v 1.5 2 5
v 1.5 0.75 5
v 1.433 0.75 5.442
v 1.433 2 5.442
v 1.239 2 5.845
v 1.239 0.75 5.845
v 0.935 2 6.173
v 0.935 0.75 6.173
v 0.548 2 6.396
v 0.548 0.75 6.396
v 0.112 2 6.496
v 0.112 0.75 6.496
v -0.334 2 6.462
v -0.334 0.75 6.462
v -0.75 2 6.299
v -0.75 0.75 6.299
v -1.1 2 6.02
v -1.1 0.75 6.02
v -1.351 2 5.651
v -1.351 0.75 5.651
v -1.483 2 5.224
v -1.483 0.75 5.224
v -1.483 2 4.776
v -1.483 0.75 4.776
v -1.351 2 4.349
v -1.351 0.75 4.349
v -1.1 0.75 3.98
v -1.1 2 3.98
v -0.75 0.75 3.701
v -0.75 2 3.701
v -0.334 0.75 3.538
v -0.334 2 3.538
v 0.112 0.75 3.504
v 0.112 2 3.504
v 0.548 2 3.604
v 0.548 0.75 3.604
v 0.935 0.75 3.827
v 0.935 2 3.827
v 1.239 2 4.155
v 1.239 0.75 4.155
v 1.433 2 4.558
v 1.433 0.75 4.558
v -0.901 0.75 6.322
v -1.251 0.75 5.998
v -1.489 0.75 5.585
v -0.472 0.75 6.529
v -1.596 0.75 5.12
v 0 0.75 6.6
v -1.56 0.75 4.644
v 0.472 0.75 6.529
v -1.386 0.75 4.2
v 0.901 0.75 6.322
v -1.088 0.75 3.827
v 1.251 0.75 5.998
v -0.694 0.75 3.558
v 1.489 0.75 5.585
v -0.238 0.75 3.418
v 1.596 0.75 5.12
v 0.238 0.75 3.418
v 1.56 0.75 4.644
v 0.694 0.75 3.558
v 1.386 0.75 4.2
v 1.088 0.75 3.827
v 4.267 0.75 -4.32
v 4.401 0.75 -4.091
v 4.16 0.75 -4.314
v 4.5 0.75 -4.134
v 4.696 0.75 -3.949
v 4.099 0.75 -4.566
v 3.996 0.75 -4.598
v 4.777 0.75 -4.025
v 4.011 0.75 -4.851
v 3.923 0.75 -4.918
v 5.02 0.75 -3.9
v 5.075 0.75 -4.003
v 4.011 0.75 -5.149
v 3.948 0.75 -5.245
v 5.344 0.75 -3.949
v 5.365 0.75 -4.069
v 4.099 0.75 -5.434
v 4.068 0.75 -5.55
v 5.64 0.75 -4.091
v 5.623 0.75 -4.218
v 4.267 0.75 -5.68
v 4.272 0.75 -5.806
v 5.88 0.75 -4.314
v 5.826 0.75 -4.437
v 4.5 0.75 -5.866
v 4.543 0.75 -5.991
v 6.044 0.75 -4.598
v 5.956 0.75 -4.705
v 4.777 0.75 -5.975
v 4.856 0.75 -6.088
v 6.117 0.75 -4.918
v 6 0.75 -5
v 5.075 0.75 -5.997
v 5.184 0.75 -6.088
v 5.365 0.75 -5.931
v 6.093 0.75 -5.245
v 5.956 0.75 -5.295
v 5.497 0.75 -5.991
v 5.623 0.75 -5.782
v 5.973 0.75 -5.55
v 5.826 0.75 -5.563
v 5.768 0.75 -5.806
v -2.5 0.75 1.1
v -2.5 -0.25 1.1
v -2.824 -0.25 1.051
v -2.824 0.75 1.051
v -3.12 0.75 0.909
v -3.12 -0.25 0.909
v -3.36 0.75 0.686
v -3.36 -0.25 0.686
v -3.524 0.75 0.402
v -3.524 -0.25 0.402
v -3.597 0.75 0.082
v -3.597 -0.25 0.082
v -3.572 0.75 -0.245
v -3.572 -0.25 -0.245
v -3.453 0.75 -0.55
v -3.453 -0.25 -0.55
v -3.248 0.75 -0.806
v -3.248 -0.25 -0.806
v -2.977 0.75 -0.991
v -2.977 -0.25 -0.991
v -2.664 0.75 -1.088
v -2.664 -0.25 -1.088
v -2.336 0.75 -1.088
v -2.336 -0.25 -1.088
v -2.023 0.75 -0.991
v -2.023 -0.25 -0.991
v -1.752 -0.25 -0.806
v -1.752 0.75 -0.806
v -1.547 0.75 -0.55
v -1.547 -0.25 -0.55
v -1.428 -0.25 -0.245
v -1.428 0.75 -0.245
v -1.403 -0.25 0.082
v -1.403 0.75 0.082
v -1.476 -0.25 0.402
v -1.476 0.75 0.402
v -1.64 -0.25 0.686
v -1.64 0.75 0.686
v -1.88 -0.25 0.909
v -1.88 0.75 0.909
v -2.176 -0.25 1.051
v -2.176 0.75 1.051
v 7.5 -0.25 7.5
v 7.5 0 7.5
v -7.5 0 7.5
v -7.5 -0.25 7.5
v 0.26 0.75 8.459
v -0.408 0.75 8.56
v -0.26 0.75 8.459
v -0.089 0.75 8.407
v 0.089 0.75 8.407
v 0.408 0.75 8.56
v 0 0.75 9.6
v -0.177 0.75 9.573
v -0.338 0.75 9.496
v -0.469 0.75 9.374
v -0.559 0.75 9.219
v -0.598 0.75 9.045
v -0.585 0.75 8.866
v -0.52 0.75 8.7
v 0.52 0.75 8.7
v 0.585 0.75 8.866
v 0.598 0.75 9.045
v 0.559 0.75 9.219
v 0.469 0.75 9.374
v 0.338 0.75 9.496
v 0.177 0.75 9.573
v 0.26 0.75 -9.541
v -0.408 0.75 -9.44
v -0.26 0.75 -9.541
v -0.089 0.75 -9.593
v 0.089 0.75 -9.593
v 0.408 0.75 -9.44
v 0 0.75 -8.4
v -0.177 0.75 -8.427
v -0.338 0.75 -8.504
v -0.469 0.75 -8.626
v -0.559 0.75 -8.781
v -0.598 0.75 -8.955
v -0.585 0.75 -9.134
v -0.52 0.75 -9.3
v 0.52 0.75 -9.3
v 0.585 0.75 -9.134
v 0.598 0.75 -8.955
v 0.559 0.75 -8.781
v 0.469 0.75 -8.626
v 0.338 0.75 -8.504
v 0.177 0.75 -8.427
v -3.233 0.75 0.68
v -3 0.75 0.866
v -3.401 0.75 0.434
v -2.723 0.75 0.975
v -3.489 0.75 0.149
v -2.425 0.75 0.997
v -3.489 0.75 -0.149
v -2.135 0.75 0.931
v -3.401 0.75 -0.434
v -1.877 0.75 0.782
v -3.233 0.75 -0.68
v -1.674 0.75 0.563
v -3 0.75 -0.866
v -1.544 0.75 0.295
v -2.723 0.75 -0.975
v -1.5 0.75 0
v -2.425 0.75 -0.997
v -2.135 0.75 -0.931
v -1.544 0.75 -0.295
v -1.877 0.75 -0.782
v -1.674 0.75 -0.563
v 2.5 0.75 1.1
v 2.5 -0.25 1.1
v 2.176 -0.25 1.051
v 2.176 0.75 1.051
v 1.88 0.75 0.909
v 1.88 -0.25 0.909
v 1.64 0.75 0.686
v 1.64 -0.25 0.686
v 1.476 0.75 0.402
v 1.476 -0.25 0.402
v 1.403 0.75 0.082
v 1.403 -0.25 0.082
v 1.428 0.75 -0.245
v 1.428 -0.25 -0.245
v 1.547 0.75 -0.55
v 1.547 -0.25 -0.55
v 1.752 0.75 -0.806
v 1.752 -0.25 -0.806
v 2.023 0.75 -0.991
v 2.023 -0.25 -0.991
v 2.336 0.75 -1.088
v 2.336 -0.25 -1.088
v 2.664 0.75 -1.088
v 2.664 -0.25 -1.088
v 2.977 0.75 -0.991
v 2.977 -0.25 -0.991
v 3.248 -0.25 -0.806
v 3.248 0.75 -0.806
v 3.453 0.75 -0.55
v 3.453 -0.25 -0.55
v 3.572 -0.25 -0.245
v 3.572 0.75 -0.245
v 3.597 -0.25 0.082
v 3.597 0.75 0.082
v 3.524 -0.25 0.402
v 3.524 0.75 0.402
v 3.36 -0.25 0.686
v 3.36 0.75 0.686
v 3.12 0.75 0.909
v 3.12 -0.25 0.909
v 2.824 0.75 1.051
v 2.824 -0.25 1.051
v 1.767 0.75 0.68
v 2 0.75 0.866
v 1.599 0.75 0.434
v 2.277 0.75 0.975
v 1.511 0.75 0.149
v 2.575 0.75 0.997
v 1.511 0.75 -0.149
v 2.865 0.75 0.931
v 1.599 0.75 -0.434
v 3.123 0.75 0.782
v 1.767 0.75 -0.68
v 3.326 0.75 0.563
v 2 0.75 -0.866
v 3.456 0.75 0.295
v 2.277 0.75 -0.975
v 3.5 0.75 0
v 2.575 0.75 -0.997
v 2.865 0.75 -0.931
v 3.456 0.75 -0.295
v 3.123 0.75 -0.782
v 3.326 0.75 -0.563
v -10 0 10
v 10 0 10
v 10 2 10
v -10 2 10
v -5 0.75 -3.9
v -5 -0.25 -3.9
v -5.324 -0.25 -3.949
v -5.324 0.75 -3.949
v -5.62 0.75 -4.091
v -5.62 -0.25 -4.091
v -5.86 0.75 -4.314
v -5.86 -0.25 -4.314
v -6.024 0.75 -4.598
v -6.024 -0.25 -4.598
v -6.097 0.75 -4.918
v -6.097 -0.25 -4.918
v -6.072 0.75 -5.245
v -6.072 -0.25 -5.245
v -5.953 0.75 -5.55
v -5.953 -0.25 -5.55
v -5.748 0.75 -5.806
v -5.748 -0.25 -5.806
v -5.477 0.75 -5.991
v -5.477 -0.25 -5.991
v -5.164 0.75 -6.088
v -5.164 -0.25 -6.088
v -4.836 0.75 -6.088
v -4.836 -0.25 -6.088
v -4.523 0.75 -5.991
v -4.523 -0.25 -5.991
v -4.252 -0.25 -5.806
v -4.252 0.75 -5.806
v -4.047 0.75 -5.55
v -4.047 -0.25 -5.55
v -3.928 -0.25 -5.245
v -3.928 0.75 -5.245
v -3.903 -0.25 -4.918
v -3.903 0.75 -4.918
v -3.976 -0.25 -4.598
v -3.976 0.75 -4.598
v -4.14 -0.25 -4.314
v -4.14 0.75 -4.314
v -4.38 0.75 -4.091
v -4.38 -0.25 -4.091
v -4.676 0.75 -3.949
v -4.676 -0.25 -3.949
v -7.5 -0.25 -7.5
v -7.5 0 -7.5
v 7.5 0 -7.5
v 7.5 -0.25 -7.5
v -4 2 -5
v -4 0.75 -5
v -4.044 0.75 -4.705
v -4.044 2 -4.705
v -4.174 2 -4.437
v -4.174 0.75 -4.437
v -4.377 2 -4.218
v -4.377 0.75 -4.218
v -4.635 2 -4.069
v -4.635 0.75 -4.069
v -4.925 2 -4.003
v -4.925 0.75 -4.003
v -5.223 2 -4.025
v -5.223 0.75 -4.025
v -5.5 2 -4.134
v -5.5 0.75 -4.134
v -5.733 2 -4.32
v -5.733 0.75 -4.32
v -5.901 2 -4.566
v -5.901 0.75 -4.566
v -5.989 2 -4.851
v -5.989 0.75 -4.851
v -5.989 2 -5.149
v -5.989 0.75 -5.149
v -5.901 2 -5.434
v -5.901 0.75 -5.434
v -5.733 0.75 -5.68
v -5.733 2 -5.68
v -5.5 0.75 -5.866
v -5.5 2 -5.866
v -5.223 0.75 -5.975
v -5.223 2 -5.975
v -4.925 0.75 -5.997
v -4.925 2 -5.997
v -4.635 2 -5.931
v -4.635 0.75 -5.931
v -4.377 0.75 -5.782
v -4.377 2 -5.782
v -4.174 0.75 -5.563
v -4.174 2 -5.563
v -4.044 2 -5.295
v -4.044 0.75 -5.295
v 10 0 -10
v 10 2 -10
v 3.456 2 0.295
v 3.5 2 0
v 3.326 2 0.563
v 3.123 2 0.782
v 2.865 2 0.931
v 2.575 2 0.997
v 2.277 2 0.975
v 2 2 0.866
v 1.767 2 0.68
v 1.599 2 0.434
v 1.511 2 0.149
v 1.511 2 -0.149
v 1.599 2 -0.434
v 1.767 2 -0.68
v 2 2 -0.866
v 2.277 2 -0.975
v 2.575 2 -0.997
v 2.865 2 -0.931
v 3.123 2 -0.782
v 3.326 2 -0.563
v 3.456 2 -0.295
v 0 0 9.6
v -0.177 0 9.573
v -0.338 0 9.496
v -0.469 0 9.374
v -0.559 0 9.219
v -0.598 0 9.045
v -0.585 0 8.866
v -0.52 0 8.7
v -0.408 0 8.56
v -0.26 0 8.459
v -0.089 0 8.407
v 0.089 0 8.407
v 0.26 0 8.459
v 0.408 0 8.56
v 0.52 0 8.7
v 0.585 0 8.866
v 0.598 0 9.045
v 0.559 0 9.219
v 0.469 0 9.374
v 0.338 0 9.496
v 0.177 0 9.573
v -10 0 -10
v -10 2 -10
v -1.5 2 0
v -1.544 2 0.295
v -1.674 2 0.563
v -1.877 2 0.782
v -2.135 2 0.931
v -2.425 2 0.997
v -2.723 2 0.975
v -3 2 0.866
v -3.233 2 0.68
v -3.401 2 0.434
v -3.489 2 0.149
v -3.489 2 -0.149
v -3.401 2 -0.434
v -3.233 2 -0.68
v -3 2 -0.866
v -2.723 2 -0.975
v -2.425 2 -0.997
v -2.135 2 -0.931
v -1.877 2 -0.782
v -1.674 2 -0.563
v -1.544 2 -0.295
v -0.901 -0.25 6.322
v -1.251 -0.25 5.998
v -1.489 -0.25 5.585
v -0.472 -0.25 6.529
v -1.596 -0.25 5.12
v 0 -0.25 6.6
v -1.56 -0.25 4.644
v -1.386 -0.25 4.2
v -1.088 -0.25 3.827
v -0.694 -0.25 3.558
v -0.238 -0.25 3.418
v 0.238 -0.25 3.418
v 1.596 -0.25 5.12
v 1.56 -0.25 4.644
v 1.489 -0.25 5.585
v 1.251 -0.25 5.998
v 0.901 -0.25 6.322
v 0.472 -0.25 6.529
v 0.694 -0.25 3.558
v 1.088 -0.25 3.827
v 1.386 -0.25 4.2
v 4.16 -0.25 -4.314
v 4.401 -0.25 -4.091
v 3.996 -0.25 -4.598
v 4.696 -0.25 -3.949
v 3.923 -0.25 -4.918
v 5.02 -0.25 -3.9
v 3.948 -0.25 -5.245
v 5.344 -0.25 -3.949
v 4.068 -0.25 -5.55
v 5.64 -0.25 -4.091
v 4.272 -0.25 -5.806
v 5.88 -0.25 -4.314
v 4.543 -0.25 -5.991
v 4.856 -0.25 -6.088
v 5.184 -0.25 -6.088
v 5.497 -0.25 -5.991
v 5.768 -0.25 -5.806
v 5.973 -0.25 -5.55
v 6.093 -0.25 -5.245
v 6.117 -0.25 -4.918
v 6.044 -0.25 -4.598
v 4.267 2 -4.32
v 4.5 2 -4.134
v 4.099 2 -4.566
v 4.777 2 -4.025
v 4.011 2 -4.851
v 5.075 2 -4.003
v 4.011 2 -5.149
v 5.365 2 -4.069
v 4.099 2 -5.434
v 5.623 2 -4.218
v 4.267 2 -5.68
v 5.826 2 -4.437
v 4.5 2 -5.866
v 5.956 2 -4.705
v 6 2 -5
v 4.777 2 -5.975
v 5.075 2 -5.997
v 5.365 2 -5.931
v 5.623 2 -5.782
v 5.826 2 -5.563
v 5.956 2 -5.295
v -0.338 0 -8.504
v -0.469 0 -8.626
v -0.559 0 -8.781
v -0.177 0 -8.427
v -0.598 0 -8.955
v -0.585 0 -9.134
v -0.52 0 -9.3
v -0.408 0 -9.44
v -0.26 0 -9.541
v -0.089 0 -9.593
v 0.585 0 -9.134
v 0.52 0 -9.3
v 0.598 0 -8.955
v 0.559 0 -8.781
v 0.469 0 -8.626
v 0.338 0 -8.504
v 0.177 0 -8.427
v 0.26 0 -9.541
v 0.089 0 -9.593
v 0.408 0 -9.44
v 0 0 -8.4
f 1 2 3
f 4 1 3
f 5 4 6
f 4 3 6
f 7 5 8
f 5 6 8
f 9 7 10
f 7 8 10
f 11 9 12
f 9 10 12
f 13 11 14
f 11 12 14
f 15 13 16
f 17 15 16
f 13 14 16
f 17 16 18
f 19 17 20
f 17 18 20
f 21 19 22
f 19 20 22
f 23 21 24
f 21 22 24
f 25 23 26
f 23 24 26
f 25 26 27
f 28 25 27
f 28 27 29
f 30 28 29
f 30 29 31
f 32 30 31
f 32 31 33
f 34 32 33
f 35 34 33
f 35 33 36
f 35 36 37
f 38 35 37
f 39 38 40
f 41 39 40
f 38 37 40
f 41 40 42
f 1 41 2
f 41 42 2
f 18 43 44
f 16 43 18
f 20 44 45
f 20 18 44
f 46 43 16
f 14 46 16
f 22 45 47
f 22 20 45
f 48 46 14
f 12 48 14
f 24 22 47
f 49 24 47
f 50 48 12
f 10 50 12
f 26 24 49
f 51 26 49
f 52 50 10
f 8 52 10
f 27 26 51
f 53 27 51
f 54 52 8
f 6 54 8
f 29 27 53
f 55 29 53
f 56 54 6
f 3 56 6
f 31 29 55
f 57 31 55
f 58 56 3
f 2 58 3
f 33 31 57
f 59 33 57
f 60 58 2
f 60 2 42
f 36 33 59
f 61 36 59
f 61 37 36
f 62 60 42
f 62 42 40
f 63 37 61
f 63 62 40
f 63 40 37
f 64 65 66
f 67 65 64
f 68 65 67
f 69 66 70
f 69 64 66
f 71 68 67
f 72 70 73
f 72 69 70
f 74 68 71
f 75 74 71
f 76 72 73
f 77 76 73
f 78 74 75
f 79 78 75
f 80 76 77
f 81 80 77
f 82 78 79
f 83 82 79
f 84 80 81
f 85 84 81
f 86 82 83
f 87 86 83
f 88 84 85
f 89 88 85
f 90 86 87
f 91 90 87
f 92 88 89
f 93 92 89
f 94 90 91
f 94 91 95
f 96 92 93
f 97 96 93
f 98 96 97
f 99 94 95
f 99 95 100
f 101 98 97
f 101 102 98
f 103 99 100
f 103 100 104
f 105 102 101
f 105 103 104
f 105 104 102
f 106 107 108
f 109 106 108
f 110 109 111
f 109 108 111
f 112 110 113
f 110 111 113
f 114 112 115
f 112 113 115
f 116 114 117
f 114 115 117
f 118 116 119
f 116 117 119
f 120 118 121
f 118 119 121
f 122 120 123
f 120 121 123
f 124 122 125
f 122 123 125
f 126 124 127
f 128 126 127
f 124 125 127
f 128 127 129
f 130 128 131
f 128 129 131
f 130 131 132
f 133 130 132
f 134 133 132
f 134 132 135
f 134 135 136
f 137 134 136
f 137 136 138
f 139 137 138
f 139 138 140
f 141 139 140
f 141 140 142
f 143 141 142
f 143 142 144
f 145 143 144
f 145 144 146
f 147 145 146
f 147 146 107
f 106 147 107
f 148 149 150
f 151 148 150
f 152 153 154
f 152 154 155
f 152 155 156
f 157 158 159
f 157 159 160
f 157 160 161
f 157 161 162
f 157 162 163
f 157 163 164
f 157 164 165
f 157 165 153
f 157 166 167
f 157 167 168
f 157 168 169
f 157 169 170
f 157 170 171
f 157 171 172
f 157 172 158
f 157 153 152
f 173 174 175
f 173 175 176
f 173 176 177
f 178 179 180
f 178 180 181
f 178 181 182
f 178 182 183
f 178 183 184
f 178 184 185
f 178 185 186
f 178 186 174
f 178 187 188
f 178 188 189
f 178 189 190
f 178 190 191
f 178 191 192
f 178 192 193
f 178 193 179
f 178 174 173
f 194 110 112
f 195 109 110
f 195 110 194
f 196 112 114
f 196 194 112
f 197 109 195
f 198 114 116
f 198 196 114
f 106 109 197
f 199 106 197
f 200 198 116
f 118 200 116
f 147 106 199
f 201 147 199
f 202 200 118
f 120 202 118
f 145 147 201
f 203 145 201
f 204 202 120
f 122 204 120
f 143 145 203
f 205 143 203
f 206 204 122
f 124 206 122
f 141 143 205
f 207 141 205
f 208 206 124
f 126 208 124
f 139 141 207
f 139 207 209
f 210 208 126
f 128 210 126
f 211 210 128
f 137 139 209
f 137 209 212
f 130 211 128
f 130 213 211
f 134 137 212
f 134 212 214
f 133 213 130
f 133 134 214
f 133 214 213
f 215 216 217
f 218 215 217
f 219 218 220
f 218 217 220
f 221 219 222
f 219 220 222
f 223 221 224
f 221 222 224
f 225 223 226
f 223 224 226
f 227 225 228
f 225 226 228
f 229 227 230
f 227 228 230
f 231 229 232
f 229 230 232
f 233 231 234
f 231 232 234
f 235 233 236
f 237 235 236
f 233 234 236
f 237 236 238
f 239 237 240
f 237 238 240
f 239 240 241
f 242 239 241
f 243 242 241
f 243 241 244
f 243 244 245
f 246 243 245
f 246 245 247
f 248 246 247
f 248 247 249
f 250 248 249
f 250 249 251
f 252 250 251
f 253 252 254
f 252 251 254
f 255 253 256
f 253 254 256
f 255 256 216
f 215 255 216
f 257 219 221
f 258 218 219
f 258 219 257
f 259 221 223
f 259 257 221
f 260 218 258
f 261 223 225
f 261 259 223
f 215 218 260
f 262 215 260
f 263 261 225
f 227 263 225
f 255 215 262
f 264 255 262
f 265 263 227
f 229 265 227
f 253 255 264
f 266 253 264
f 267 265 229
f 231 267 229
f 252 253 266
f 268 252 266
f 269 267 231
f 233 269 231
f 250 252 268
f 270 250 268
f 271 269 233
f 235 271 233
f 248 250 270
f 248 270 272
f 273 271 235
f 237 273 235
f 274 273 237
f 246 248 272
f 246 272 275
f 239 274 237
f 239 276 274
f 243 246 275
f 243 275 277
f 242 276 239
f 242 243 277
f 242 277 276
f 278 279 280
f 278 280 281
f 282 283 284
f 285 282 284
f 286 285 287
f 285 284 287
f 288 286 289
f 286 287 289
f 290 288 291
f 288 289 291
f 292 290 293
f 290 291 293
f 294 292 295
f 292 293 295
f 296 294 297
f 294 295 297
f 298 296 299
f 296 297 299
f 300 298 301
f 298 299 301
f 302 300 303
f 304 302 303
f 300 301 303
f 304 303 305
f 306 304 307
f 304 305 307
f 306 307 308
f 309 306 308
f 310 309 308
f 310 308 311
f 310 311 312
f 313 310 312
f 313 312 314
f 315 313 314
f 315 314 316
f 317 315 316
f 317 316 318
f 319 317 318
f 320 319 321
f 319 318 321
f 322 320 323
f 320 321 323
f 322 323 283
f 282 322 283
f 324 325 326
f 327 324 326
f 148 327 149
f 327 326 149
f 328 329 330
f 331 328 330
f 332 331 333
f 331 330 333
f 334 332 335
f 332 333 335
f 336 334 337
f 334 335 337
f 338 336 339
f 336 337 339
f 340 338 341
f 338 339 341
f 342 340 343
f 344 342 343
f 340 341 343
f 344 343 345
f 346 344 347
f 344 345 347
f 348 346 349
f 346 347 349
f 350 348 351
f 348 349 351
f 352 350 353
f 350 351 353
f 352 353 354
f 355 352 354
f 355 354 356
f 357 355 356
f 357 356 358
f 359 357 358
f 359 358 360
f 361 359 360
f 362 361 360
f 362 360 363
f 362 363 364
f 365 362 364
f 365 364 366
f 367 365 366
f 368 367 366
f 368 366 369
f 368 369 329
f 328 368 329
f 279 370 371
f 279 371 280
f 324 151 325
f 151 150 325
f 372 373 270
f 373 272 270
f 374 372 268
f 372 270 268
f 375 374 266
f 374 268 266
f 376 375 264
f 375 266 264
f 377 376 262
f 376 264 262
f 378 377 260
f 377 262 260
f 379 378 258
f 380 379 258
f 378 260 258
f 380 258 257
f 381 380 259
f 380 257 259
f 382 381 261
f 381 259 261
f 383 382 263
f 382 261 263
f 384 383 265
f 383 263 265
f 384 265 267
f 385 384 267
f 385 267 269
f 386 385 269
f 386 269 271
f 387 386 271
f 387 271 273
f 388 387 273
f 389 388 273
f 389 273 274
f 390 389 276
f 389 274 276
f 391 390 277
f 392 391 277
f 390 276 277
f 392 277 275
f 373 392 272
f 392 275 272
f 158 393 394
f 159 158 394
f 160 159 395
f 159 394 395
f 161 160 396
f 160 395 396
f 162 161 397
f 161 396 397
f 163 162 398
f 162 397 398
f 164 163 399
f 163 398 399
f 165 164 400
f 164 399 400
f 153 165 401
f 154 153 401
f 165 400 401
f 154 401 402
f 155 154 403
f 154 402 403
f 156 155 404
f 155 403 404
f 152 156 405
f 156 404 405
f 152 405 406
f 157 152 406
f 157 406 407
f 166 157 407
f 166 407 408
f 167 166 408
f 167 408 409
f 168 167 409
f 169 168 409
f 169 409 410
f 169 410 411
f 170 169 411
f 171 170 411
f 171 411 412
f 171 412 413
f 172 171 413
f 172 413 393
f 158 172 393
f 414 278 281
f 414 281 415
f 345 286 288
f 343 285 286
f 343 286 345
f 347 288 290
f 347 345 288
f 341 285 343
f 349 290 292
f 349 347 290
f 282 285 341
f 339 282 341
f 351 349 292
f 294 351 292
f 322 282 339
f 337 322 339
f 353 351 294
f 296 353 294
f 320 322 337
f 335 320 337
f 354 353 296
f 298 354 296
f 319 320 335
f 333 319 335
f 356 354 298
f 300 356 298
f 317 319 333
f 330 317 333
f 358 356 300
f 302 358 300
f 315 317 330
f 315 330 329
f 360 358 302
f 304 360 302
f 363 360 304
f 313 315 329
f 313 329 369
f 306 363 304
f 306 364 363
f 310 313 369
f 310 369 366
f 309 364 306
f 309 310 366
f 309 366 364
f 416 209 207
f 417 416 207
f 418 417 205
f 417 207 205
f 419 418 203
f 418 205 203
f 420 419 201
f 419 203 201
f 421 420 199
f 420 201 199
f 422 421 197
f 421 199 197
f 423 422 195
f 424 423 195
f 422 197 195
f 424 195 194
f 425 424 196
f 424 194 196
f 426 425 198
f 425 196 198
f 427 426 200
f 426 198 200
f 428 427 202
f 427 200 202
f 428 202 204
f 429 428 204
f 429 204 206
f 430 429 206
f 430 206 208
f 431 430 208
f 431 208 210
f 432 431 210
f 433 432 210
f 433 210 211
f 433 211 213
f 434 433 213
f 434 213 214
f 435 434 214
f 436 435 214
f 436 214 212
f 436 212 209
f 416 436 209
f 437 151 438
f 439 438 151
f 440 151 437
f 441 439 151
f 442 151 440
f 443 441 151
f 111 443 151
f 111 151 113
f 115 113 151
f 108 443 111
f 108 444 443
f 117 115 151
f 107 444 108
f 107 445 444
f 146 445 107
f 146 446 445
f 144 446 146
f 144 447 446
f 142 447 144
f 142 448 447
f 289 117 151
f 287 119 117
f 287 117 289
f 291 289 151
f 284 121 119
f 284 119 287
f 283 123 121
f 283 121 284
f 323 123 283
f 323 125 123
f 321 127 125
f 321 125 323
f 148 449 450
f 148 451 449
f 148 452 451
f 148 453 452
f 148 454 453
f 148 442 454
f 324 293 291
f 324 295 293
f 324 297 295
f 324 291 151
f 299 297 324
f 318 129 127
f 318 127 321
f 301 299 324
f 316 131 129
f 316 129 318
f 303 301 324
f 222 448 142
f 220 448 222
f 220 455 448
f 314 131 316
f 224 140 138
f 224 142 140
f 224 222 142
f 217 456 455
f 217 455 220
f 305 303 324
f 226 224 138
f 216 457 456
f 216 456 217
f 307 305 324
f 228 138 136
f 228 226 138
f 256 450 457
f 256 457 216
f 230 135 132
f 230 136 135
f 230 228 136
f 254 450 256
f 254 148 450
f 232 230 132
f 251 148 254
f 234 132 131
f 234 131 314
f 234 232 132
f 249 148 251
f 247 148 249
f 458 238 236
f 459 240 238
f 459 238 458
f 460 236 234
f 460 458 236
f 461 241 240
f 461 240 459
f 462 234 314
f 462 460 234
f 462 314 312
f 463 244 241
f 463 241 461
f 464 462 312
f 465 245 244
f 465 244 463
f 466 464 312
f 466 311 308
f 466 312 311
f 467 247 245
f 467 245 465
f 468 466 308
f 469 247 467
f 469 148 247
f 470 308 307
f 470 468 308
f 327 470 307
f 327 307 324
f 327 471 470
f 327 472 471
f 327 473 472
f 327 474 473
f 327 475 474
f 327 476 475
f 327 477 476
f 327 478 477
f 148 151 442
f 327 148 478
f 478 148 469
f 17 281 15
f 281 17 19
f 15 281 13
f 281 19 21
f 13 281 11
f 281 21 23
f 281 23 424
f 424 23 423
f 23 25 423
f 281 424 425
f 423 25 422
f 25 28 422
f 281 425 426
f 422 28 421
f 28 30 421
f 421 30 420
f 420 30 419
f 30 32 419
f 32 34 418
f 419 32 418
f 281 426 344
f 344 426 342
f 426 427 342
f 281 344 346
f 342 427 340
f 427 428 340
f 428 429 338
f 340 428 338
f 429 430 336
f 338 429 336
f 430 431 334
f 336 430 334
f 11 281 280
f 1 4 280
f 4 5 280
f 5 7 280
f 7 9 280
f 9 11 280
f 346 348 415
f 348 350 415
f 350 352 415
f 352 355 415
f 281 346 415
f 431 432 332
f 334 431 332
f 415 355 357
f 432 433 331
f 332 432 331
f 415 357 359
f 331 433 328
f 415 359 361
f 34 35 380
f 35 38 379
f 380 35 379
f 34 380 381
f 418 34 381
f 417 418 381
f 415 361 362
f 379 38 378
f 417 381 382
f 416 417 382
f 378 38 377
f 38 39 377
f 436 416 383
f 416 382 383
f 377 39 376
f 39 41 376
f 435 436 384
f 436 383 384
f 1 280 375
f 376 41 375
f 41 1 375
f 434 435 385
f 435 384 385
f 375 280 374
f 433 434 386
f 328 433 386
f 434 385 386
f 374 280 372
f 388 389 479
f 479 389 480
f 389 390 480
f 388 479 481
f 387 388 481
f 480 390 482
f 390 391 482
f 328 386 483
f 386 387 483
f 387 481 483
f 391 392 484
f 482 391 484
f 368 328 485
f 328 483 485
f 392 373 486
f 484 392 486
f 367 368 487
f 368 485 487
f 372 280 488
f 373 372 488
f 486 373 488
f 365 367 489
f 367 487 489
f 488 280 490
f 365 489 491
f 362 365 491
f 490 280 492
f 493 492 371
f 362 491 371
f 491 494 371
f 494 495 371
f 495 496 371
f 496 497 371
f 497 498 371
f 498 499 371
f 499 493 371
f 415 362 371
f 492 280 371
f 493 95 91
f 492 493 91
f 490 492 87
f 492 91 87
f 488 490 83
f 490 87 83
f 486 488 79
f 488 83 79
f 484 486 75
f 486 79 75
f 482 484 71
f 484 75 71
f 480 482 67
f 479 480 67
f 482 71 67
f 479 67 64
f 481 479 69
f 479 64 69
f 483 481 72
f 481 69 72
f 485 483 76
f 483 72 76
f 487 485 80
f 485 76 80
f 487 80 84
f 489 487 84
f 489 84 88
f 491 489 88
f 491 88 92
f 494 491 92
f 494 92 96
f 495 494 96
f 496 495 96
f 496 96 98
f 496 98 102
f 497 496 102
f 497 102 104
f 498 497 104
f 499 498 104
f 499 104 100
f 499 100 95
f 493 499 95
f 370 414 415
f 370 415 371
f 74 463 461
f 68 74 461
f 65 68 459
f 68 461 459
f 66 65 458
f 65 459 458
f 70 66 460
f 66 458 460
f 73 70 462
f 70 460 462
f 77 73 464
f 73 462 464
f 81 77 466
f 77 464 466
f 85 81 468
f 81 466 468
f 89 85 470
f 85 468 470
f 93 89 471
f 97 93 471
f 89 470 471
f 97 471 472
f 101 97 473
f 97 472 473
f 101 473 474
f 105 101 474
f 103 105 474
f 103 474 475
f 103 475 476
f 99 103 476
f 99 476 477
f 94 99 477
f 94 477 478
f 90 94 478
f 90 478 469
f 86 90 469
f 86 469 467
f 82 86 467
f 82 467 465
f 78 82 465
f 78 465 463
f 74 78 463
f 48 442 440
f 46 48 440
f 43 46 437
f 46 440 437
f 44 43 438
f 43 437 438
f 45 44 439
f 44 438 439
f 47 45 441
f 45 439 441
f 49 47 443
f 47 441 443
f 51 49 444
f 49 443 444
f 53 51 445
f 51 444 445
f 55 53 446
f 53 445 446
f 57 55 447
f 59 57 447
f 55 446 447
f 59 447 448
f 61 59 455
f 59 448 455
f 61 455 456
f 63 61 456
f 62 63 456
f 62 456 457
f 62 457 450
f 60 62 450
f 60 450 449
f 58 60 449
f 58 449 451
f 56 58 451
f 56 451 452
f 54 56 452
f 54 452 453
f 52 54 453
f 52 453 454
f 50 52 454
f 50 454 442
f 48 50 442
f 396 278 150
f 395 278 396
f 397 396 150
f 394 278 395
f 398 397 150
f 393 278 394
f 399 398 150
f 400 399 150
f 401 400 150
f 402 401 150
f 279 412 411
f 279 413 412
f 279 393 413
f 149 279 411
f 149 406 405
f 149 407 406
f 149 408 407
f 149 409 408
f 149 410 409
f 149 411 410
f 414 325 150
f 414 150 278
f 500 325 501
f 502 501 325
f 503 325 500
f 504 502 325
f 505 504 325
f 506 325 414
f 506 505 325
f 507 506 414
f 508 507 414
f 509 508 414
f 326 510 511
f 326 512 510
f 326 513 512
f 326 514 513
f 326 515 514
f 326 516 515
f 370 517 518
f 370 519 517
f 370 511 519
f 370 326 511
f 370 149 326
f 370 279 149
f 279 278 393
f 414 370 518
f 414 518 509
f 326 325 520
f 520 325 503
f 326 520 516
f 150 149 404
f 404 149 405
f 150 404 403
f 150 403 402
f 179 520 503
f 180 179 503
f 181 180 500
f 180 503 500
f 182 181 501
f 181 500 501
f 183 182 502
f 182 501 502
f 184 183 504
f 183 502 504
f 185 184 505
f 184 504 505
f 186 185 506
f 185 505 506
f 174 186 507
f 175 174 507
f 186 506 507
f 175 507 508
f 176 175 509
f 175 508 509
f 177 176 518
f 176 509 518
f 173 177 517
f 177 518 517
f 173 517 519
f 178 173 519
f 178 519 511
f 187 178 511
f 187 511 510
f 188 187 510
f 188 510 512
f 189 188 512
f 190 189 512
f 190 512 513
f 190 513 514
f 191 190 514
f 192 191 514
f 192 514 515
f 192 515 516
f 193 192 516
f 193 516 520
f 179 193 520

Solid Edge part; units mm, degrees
sketch "Sketch1" plane through (0, 0, 0) normal (0, -1, 0) x (1, 0, 0)
  line L0 (10, 10) -> (-10, 10)
  line L1 (-10, 10) -> (-10, -10)
  line L2 (-10, -10) -> (10, -10)
  line L3 (10, -10) -> (10, 10)
  circle A0 centre (-2.5, 0) radius 1
  circle A1 centre (0, 5) radius 1.5
  circle A2 centre (-5, -5) radius 1
  circle A3 centre (5, -5) radius 1
  circle A4 centre (2.5, 0) radius 1
extrude "Protrusion1" add sketch "Sketch1" against normal blind 2
sketch "Sketch2" plane through (0, 0, 0) normal (0, -1, 0) x (1, 0, 0)
  line L0 (7.5, 7.5) -> (-7.5, 7.5)
  line L1 (-7.5, 7.5) -> (-7.5, -7.5)
  line L2 (-7.5, -7.5) -> (7.5, -7.5)
  line L3 (7.5, -7.5) -> (7.5, 7.5)
  circle A0 centre (0, 5) radius 1.5
  circle A1 centre (-2.5, 0) radius 1
  circle A2 centre (2.5, 0) radius 1
  circle A3 centre (5, -5) radius 1
  circle A4 centre (-5, -5) radius 1
extrude "ExtrudedProtrusion_2" add sketch "Sketch2" along normal blind 0.25
sketch "Sketch3" plane through (0, -0.25, 0) normal (0, -1, 0) x (0, 0, 1)
  circle A0 centre (-5, 5) radius 1.1
  circle A1 centre (0, 2.5) radius 1.1
  circle A2 centre (0, -2.5) radius 1.1
  circle A3 centre (-5, -5.0202) radius 1.1
  circle A4 centre (5, 0) radius 1.6
extrude "ExtrudedCutout_1" cut sketch "Sketch3" against normal blind 1
sketch "Sketch4" plane through (0, -0.25, 0) normal (0, -1, 0) x (0, 0, 1)
  circle A0 centre (-9, 0) radius 0.6
  circle A1 centre (9, 0) radius 0.6
extrude "ExtrudedCutout_3" cut sketch "Sketch4" against normal blind 1
